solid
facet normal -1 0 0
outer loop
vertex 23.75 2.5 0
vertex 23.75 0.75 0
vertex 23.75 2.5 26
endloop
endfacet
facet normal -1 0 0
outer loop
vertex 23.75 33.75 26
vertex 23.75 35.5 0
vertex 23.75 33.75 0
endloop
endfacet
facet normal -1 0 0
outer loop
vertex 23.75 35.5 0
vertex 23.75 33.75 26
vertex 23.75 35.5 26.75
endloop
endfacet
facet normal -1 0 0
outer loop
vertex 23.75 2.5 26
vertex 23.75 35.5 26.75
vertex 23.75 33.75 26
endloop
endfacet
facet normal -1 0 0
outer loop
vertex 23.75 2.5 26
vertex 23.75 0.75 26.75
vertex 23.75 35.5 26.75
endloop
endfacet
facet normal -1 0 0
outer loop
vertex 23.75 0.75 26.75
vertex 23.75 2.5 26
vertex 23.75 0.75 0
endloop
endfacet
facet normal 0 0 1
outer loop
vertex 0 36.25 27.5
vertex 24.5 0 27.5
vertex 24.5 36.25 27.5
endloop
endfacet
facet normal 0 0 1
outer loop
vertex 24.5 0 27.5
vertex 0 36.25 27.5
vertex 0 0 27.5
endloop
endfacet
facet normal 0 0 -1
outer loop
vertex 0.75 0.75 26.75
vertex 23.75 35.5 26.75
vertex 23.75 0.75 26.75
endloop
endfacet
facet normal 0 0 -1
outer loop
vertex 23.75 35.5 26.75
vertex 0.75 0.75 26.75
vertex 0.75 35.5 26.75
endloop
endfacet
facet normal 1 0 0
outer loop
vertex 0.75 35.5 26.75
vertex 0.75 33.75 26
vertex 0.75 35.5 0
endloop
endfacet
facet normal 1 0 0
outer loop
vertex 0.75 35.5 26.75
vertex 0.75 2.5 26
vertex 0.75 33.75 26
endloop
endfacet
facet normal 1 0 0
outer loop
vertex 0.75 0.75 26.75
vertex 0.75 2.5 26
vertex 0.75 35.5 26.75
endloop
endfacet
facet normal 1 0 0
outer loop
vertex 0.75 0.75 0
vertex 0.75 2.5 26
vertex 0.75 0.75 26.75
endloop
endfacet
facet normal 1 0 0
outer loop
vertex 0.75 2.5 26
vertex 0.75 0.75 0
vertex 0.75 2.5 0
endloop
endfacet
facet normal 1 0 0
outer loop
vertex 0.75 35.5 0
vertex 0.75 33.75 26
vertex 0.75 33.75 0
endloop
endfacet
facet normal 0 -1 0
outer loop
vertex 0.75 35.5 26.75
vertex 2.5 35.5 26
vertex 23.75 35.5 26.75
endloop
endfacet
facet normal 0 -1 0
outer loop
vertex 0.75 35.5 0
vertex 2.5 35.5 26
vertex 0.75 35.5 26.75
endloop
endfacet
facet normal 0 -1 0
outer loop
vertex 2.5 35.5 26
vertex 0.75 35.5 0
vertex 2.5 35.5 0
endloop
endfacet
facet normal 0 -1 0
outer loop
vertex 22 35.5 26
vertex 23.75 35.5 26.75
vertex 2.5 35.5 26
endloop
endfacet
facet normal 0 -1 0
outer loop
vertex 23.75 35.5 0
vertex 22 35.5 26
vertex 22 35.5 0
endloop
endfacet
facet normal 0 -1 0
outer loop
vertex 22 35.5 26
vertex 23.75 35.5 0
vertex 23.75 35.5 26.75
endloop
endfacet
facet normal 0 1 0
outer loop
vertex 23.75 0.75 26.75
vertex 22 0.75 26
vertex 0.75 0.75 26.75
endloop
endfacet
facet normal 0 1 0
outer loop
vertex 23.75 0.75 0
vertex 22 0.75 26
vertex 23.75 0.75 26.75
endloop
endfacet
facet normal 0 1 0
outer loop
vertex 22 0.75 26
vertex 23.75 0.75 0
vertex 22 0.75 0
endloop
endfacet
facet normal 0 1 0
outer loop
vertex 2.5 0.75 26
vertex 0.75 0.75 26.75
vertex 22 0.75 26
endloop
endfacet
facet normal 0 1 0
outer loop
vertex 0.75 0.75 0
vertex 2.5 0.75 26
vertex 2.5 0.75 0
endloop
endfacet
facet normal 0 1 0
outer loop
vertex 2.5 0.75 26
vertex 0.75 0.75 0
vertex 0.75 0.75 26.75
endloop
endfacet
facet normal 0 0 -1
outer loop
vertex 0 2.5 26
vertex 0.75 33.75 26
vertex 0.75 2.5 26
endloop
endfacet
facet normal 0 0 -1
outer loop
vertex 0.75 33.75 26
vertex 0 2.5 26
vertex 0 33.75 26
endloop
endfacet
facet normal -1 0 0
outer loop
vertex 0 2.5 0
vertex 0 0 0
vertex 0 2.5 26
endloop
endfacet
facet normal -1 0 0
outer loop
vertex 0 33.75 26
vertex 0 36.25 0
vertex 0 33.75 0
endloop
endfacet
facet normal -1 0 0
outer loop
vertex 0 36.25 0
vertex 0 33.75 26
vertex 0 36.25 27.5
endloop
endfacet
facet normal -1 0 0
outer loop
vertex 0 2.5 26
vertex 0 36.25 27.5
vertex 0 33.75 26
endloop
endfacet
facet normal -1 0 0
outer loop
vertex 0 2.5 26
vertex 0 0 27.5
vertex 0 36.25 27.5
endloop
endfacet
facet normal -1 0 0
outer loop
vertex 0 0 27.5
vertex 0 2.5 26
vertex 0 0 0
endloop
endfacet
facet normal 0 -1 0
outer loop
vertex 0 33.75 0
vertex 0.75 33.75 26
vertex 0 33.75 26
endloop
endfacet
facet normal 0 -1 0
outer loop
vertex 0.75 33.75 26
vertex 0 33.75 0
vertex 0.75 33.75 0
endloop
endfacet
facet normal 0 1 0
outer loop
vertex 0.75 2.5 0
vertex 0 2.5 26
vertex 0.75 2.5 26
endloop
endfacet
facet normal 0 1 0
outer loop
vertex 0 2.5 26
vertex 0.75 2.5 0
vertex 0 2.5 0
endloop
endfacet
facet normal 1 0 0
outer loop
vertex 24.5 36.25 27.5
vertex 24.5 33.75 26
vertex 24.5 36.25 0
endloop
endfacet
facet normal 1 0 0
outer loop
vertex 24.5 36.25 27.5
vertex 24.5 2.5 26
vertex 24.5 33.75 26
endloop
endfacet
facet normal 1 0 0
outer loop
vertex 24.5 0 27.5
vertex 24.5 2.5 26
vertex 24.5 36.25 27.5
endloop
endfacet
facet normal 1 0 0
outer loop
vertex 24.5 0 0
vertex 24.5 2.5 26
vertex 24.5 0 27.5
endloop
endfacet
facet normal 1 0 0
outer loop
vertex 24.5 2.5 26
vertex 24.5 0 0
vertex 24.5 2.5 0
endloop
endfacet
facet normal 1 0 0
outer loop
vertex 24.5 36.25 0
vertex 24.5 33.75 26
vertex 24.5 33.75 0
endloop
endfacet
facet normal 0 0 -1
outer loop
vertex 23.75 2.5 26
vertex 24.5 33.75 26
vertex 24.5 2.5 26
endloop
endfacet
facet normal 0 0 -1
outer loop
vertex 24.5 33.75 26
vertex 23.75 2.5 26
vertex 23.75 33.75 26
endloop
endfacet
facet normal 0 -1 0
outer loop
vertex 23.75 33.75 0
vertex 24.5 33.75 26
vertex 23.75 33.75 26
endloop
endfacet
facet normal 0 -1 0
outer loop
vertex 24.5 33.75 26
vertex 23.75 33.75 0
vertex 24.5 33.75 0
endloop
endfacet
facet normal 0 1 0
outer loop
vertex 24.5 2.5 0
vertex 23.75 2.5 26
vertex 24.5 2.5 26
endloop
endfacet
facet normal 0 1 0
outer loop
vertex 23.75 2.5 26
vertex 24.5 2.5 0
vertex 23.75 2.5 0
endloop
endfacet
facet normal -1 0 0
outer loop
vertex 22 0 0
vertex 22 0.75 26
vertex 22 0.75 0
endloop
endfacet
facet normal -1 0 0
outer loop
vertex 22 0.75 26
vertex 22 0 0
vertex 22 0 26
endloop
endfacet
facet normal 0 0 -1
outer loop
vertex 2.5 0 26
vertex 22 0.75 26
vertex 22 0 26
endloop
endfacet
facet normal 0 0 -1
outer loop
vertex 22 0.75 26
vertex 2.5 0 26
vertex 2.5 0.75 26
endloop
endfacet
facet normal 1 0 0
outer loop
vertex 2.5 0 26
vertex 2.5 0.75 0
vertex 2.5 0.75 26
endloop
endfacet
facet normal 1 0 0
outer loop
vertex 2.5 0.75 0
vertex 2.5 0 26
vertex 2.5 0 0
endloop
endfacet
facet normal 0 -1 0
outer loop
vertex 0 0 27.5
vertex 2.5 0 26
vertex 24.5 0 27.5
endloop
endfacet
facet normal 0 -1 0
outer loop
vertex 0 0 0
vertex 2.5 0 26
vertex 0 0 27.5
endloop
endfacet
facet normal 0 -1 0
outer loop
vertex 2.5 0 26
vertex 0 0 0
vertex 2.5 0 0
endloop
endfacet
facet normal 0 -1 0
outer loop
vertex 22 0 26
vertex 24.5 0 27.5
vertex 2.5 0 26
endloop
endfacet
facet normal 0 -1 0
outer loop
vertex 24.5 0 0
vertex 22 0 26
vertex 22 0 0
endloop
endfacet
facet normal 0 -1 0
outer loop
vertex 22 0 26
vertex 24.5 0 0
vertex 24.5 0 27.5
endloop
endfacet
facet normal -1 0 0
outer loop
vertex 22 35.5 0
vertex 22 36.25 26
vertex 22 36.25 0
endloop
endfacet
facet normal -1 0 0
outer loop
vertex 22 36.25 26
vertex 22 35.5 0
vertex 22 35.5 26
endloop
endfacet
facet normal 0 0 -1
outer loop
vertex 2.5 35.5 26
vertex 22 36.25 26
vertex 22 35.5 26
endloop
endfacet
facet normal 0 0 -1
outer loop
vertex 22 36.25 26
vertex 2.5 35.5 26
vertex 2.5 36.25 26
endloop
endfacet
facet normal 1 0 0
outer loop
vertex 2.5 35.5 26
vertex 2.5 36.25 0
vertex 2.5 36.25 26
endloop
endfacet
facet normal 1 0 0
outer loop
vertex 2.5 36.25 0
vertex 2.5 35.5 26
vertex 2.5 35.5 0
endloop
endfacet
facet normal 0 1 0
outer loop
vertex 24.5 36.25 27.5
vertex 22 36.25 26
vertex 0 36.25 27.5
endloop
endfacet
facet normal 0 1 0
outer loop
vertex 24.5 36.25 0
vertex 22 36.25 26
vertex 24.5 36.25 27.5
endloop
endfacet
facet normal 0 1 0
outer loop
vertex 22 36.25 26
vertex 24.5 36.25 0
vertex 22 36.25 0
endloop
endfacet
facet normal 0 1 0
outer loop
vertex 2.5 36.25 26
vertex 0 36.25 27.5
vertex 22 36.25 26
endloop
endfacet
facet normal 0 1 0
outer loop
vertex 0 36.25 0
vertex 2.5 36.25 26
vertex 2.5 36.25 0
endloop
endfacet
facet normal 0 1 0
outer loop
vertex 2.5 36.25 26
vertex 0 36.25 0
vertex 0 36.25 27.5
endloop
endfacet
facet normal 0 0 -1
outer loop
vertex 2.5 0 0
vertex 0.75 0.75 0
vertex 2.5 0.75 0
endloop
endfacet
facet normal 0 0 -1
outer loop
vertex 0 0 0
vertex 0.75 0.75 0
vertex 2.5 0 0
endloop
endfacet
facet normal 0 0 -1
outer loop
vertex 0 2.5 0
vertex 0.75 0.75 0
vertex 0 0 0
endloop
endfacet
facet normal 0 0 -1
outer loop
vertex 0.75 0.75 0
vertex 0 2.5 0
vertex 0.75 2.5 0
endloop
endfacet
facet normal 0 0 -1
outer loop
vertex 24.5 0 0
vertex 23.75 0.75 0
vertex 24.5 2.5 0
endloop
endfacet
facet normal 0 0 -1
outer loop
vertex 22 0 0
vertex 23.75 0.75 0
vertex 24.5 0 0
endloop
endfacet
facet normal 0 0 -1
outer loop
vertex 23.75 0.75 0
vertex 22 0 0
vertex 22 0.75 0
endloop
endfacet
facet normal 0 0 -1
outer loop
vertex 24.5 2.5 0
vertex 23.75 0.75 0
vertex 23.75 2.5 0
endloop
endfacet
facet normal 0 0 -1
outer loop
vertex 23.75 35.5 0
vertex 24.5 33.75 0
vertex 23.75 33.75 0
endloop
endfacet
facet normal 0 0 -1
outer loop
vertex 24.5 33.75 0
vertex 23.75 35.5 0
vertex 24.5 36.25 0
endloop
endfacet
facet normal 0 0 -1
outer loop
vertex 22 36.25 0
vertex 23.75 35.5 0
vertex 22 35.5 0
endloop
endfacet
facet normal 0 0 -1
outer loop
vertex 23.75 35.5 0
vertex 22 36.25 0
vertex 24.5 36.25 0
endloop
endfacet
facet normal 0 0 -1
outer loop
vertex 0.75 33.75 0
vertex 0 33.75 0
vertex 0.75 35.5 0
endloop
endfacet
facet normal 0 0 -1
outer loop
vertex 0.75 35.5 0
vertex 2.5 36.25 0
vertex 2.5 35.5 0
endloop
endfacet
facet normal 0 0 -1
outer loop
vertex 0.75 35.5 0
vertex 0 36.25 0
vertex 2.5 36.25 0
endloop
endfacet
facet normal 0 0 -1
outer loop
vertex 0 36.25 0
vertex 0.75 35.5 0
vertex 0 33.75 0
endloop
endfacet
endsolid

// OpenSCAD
//Kennel Cover

height = 27.5;
depth = 36.25;
width = 24.5;

thickness = 0.75;
legBoardThickness = 2.5;

//2 inches wide for legs

module leg(){
    cube([thickness, legBoardThickness, height]);
    cube([legBoardThickness, thickness, height]);
}

module top(){
    
    translate([thickness, thickness, height - thickness])
    cube([width - thickness*2, depth - thickness*2, thickness]);
    
    translate([0, legBoardThickness, height - 1.5])
    cube([thickness, depth - legBoardThickness*2, 1.5]);
    translate([width - thickness, legBoardThickness, height - 1.5])
    cube([thickness, depth - legBoardThickness*2, 1.5]);
    translate([2.5, 0, height - 1.5])
    cube([width - legBoardThickness*2, thickness, 1.5]);
    translate([2.5, depth - thickness, height - 1.5])
    cube([width - legBoardThickness*2, thickness, 1.5]);
    
}

module legssss(){
    
    leg();
    translate([width, 0, 0])
    rotate([0, 0, 90])
    leg();
    translate([width, depth, 0])
    rotate([0, 0, 180])
    leg();
    translate([0, depth, 0])
    rotate([0, 0, -90])
    leg();
    
}






module main(){
    
    top();
    legssss();
    
}main();
